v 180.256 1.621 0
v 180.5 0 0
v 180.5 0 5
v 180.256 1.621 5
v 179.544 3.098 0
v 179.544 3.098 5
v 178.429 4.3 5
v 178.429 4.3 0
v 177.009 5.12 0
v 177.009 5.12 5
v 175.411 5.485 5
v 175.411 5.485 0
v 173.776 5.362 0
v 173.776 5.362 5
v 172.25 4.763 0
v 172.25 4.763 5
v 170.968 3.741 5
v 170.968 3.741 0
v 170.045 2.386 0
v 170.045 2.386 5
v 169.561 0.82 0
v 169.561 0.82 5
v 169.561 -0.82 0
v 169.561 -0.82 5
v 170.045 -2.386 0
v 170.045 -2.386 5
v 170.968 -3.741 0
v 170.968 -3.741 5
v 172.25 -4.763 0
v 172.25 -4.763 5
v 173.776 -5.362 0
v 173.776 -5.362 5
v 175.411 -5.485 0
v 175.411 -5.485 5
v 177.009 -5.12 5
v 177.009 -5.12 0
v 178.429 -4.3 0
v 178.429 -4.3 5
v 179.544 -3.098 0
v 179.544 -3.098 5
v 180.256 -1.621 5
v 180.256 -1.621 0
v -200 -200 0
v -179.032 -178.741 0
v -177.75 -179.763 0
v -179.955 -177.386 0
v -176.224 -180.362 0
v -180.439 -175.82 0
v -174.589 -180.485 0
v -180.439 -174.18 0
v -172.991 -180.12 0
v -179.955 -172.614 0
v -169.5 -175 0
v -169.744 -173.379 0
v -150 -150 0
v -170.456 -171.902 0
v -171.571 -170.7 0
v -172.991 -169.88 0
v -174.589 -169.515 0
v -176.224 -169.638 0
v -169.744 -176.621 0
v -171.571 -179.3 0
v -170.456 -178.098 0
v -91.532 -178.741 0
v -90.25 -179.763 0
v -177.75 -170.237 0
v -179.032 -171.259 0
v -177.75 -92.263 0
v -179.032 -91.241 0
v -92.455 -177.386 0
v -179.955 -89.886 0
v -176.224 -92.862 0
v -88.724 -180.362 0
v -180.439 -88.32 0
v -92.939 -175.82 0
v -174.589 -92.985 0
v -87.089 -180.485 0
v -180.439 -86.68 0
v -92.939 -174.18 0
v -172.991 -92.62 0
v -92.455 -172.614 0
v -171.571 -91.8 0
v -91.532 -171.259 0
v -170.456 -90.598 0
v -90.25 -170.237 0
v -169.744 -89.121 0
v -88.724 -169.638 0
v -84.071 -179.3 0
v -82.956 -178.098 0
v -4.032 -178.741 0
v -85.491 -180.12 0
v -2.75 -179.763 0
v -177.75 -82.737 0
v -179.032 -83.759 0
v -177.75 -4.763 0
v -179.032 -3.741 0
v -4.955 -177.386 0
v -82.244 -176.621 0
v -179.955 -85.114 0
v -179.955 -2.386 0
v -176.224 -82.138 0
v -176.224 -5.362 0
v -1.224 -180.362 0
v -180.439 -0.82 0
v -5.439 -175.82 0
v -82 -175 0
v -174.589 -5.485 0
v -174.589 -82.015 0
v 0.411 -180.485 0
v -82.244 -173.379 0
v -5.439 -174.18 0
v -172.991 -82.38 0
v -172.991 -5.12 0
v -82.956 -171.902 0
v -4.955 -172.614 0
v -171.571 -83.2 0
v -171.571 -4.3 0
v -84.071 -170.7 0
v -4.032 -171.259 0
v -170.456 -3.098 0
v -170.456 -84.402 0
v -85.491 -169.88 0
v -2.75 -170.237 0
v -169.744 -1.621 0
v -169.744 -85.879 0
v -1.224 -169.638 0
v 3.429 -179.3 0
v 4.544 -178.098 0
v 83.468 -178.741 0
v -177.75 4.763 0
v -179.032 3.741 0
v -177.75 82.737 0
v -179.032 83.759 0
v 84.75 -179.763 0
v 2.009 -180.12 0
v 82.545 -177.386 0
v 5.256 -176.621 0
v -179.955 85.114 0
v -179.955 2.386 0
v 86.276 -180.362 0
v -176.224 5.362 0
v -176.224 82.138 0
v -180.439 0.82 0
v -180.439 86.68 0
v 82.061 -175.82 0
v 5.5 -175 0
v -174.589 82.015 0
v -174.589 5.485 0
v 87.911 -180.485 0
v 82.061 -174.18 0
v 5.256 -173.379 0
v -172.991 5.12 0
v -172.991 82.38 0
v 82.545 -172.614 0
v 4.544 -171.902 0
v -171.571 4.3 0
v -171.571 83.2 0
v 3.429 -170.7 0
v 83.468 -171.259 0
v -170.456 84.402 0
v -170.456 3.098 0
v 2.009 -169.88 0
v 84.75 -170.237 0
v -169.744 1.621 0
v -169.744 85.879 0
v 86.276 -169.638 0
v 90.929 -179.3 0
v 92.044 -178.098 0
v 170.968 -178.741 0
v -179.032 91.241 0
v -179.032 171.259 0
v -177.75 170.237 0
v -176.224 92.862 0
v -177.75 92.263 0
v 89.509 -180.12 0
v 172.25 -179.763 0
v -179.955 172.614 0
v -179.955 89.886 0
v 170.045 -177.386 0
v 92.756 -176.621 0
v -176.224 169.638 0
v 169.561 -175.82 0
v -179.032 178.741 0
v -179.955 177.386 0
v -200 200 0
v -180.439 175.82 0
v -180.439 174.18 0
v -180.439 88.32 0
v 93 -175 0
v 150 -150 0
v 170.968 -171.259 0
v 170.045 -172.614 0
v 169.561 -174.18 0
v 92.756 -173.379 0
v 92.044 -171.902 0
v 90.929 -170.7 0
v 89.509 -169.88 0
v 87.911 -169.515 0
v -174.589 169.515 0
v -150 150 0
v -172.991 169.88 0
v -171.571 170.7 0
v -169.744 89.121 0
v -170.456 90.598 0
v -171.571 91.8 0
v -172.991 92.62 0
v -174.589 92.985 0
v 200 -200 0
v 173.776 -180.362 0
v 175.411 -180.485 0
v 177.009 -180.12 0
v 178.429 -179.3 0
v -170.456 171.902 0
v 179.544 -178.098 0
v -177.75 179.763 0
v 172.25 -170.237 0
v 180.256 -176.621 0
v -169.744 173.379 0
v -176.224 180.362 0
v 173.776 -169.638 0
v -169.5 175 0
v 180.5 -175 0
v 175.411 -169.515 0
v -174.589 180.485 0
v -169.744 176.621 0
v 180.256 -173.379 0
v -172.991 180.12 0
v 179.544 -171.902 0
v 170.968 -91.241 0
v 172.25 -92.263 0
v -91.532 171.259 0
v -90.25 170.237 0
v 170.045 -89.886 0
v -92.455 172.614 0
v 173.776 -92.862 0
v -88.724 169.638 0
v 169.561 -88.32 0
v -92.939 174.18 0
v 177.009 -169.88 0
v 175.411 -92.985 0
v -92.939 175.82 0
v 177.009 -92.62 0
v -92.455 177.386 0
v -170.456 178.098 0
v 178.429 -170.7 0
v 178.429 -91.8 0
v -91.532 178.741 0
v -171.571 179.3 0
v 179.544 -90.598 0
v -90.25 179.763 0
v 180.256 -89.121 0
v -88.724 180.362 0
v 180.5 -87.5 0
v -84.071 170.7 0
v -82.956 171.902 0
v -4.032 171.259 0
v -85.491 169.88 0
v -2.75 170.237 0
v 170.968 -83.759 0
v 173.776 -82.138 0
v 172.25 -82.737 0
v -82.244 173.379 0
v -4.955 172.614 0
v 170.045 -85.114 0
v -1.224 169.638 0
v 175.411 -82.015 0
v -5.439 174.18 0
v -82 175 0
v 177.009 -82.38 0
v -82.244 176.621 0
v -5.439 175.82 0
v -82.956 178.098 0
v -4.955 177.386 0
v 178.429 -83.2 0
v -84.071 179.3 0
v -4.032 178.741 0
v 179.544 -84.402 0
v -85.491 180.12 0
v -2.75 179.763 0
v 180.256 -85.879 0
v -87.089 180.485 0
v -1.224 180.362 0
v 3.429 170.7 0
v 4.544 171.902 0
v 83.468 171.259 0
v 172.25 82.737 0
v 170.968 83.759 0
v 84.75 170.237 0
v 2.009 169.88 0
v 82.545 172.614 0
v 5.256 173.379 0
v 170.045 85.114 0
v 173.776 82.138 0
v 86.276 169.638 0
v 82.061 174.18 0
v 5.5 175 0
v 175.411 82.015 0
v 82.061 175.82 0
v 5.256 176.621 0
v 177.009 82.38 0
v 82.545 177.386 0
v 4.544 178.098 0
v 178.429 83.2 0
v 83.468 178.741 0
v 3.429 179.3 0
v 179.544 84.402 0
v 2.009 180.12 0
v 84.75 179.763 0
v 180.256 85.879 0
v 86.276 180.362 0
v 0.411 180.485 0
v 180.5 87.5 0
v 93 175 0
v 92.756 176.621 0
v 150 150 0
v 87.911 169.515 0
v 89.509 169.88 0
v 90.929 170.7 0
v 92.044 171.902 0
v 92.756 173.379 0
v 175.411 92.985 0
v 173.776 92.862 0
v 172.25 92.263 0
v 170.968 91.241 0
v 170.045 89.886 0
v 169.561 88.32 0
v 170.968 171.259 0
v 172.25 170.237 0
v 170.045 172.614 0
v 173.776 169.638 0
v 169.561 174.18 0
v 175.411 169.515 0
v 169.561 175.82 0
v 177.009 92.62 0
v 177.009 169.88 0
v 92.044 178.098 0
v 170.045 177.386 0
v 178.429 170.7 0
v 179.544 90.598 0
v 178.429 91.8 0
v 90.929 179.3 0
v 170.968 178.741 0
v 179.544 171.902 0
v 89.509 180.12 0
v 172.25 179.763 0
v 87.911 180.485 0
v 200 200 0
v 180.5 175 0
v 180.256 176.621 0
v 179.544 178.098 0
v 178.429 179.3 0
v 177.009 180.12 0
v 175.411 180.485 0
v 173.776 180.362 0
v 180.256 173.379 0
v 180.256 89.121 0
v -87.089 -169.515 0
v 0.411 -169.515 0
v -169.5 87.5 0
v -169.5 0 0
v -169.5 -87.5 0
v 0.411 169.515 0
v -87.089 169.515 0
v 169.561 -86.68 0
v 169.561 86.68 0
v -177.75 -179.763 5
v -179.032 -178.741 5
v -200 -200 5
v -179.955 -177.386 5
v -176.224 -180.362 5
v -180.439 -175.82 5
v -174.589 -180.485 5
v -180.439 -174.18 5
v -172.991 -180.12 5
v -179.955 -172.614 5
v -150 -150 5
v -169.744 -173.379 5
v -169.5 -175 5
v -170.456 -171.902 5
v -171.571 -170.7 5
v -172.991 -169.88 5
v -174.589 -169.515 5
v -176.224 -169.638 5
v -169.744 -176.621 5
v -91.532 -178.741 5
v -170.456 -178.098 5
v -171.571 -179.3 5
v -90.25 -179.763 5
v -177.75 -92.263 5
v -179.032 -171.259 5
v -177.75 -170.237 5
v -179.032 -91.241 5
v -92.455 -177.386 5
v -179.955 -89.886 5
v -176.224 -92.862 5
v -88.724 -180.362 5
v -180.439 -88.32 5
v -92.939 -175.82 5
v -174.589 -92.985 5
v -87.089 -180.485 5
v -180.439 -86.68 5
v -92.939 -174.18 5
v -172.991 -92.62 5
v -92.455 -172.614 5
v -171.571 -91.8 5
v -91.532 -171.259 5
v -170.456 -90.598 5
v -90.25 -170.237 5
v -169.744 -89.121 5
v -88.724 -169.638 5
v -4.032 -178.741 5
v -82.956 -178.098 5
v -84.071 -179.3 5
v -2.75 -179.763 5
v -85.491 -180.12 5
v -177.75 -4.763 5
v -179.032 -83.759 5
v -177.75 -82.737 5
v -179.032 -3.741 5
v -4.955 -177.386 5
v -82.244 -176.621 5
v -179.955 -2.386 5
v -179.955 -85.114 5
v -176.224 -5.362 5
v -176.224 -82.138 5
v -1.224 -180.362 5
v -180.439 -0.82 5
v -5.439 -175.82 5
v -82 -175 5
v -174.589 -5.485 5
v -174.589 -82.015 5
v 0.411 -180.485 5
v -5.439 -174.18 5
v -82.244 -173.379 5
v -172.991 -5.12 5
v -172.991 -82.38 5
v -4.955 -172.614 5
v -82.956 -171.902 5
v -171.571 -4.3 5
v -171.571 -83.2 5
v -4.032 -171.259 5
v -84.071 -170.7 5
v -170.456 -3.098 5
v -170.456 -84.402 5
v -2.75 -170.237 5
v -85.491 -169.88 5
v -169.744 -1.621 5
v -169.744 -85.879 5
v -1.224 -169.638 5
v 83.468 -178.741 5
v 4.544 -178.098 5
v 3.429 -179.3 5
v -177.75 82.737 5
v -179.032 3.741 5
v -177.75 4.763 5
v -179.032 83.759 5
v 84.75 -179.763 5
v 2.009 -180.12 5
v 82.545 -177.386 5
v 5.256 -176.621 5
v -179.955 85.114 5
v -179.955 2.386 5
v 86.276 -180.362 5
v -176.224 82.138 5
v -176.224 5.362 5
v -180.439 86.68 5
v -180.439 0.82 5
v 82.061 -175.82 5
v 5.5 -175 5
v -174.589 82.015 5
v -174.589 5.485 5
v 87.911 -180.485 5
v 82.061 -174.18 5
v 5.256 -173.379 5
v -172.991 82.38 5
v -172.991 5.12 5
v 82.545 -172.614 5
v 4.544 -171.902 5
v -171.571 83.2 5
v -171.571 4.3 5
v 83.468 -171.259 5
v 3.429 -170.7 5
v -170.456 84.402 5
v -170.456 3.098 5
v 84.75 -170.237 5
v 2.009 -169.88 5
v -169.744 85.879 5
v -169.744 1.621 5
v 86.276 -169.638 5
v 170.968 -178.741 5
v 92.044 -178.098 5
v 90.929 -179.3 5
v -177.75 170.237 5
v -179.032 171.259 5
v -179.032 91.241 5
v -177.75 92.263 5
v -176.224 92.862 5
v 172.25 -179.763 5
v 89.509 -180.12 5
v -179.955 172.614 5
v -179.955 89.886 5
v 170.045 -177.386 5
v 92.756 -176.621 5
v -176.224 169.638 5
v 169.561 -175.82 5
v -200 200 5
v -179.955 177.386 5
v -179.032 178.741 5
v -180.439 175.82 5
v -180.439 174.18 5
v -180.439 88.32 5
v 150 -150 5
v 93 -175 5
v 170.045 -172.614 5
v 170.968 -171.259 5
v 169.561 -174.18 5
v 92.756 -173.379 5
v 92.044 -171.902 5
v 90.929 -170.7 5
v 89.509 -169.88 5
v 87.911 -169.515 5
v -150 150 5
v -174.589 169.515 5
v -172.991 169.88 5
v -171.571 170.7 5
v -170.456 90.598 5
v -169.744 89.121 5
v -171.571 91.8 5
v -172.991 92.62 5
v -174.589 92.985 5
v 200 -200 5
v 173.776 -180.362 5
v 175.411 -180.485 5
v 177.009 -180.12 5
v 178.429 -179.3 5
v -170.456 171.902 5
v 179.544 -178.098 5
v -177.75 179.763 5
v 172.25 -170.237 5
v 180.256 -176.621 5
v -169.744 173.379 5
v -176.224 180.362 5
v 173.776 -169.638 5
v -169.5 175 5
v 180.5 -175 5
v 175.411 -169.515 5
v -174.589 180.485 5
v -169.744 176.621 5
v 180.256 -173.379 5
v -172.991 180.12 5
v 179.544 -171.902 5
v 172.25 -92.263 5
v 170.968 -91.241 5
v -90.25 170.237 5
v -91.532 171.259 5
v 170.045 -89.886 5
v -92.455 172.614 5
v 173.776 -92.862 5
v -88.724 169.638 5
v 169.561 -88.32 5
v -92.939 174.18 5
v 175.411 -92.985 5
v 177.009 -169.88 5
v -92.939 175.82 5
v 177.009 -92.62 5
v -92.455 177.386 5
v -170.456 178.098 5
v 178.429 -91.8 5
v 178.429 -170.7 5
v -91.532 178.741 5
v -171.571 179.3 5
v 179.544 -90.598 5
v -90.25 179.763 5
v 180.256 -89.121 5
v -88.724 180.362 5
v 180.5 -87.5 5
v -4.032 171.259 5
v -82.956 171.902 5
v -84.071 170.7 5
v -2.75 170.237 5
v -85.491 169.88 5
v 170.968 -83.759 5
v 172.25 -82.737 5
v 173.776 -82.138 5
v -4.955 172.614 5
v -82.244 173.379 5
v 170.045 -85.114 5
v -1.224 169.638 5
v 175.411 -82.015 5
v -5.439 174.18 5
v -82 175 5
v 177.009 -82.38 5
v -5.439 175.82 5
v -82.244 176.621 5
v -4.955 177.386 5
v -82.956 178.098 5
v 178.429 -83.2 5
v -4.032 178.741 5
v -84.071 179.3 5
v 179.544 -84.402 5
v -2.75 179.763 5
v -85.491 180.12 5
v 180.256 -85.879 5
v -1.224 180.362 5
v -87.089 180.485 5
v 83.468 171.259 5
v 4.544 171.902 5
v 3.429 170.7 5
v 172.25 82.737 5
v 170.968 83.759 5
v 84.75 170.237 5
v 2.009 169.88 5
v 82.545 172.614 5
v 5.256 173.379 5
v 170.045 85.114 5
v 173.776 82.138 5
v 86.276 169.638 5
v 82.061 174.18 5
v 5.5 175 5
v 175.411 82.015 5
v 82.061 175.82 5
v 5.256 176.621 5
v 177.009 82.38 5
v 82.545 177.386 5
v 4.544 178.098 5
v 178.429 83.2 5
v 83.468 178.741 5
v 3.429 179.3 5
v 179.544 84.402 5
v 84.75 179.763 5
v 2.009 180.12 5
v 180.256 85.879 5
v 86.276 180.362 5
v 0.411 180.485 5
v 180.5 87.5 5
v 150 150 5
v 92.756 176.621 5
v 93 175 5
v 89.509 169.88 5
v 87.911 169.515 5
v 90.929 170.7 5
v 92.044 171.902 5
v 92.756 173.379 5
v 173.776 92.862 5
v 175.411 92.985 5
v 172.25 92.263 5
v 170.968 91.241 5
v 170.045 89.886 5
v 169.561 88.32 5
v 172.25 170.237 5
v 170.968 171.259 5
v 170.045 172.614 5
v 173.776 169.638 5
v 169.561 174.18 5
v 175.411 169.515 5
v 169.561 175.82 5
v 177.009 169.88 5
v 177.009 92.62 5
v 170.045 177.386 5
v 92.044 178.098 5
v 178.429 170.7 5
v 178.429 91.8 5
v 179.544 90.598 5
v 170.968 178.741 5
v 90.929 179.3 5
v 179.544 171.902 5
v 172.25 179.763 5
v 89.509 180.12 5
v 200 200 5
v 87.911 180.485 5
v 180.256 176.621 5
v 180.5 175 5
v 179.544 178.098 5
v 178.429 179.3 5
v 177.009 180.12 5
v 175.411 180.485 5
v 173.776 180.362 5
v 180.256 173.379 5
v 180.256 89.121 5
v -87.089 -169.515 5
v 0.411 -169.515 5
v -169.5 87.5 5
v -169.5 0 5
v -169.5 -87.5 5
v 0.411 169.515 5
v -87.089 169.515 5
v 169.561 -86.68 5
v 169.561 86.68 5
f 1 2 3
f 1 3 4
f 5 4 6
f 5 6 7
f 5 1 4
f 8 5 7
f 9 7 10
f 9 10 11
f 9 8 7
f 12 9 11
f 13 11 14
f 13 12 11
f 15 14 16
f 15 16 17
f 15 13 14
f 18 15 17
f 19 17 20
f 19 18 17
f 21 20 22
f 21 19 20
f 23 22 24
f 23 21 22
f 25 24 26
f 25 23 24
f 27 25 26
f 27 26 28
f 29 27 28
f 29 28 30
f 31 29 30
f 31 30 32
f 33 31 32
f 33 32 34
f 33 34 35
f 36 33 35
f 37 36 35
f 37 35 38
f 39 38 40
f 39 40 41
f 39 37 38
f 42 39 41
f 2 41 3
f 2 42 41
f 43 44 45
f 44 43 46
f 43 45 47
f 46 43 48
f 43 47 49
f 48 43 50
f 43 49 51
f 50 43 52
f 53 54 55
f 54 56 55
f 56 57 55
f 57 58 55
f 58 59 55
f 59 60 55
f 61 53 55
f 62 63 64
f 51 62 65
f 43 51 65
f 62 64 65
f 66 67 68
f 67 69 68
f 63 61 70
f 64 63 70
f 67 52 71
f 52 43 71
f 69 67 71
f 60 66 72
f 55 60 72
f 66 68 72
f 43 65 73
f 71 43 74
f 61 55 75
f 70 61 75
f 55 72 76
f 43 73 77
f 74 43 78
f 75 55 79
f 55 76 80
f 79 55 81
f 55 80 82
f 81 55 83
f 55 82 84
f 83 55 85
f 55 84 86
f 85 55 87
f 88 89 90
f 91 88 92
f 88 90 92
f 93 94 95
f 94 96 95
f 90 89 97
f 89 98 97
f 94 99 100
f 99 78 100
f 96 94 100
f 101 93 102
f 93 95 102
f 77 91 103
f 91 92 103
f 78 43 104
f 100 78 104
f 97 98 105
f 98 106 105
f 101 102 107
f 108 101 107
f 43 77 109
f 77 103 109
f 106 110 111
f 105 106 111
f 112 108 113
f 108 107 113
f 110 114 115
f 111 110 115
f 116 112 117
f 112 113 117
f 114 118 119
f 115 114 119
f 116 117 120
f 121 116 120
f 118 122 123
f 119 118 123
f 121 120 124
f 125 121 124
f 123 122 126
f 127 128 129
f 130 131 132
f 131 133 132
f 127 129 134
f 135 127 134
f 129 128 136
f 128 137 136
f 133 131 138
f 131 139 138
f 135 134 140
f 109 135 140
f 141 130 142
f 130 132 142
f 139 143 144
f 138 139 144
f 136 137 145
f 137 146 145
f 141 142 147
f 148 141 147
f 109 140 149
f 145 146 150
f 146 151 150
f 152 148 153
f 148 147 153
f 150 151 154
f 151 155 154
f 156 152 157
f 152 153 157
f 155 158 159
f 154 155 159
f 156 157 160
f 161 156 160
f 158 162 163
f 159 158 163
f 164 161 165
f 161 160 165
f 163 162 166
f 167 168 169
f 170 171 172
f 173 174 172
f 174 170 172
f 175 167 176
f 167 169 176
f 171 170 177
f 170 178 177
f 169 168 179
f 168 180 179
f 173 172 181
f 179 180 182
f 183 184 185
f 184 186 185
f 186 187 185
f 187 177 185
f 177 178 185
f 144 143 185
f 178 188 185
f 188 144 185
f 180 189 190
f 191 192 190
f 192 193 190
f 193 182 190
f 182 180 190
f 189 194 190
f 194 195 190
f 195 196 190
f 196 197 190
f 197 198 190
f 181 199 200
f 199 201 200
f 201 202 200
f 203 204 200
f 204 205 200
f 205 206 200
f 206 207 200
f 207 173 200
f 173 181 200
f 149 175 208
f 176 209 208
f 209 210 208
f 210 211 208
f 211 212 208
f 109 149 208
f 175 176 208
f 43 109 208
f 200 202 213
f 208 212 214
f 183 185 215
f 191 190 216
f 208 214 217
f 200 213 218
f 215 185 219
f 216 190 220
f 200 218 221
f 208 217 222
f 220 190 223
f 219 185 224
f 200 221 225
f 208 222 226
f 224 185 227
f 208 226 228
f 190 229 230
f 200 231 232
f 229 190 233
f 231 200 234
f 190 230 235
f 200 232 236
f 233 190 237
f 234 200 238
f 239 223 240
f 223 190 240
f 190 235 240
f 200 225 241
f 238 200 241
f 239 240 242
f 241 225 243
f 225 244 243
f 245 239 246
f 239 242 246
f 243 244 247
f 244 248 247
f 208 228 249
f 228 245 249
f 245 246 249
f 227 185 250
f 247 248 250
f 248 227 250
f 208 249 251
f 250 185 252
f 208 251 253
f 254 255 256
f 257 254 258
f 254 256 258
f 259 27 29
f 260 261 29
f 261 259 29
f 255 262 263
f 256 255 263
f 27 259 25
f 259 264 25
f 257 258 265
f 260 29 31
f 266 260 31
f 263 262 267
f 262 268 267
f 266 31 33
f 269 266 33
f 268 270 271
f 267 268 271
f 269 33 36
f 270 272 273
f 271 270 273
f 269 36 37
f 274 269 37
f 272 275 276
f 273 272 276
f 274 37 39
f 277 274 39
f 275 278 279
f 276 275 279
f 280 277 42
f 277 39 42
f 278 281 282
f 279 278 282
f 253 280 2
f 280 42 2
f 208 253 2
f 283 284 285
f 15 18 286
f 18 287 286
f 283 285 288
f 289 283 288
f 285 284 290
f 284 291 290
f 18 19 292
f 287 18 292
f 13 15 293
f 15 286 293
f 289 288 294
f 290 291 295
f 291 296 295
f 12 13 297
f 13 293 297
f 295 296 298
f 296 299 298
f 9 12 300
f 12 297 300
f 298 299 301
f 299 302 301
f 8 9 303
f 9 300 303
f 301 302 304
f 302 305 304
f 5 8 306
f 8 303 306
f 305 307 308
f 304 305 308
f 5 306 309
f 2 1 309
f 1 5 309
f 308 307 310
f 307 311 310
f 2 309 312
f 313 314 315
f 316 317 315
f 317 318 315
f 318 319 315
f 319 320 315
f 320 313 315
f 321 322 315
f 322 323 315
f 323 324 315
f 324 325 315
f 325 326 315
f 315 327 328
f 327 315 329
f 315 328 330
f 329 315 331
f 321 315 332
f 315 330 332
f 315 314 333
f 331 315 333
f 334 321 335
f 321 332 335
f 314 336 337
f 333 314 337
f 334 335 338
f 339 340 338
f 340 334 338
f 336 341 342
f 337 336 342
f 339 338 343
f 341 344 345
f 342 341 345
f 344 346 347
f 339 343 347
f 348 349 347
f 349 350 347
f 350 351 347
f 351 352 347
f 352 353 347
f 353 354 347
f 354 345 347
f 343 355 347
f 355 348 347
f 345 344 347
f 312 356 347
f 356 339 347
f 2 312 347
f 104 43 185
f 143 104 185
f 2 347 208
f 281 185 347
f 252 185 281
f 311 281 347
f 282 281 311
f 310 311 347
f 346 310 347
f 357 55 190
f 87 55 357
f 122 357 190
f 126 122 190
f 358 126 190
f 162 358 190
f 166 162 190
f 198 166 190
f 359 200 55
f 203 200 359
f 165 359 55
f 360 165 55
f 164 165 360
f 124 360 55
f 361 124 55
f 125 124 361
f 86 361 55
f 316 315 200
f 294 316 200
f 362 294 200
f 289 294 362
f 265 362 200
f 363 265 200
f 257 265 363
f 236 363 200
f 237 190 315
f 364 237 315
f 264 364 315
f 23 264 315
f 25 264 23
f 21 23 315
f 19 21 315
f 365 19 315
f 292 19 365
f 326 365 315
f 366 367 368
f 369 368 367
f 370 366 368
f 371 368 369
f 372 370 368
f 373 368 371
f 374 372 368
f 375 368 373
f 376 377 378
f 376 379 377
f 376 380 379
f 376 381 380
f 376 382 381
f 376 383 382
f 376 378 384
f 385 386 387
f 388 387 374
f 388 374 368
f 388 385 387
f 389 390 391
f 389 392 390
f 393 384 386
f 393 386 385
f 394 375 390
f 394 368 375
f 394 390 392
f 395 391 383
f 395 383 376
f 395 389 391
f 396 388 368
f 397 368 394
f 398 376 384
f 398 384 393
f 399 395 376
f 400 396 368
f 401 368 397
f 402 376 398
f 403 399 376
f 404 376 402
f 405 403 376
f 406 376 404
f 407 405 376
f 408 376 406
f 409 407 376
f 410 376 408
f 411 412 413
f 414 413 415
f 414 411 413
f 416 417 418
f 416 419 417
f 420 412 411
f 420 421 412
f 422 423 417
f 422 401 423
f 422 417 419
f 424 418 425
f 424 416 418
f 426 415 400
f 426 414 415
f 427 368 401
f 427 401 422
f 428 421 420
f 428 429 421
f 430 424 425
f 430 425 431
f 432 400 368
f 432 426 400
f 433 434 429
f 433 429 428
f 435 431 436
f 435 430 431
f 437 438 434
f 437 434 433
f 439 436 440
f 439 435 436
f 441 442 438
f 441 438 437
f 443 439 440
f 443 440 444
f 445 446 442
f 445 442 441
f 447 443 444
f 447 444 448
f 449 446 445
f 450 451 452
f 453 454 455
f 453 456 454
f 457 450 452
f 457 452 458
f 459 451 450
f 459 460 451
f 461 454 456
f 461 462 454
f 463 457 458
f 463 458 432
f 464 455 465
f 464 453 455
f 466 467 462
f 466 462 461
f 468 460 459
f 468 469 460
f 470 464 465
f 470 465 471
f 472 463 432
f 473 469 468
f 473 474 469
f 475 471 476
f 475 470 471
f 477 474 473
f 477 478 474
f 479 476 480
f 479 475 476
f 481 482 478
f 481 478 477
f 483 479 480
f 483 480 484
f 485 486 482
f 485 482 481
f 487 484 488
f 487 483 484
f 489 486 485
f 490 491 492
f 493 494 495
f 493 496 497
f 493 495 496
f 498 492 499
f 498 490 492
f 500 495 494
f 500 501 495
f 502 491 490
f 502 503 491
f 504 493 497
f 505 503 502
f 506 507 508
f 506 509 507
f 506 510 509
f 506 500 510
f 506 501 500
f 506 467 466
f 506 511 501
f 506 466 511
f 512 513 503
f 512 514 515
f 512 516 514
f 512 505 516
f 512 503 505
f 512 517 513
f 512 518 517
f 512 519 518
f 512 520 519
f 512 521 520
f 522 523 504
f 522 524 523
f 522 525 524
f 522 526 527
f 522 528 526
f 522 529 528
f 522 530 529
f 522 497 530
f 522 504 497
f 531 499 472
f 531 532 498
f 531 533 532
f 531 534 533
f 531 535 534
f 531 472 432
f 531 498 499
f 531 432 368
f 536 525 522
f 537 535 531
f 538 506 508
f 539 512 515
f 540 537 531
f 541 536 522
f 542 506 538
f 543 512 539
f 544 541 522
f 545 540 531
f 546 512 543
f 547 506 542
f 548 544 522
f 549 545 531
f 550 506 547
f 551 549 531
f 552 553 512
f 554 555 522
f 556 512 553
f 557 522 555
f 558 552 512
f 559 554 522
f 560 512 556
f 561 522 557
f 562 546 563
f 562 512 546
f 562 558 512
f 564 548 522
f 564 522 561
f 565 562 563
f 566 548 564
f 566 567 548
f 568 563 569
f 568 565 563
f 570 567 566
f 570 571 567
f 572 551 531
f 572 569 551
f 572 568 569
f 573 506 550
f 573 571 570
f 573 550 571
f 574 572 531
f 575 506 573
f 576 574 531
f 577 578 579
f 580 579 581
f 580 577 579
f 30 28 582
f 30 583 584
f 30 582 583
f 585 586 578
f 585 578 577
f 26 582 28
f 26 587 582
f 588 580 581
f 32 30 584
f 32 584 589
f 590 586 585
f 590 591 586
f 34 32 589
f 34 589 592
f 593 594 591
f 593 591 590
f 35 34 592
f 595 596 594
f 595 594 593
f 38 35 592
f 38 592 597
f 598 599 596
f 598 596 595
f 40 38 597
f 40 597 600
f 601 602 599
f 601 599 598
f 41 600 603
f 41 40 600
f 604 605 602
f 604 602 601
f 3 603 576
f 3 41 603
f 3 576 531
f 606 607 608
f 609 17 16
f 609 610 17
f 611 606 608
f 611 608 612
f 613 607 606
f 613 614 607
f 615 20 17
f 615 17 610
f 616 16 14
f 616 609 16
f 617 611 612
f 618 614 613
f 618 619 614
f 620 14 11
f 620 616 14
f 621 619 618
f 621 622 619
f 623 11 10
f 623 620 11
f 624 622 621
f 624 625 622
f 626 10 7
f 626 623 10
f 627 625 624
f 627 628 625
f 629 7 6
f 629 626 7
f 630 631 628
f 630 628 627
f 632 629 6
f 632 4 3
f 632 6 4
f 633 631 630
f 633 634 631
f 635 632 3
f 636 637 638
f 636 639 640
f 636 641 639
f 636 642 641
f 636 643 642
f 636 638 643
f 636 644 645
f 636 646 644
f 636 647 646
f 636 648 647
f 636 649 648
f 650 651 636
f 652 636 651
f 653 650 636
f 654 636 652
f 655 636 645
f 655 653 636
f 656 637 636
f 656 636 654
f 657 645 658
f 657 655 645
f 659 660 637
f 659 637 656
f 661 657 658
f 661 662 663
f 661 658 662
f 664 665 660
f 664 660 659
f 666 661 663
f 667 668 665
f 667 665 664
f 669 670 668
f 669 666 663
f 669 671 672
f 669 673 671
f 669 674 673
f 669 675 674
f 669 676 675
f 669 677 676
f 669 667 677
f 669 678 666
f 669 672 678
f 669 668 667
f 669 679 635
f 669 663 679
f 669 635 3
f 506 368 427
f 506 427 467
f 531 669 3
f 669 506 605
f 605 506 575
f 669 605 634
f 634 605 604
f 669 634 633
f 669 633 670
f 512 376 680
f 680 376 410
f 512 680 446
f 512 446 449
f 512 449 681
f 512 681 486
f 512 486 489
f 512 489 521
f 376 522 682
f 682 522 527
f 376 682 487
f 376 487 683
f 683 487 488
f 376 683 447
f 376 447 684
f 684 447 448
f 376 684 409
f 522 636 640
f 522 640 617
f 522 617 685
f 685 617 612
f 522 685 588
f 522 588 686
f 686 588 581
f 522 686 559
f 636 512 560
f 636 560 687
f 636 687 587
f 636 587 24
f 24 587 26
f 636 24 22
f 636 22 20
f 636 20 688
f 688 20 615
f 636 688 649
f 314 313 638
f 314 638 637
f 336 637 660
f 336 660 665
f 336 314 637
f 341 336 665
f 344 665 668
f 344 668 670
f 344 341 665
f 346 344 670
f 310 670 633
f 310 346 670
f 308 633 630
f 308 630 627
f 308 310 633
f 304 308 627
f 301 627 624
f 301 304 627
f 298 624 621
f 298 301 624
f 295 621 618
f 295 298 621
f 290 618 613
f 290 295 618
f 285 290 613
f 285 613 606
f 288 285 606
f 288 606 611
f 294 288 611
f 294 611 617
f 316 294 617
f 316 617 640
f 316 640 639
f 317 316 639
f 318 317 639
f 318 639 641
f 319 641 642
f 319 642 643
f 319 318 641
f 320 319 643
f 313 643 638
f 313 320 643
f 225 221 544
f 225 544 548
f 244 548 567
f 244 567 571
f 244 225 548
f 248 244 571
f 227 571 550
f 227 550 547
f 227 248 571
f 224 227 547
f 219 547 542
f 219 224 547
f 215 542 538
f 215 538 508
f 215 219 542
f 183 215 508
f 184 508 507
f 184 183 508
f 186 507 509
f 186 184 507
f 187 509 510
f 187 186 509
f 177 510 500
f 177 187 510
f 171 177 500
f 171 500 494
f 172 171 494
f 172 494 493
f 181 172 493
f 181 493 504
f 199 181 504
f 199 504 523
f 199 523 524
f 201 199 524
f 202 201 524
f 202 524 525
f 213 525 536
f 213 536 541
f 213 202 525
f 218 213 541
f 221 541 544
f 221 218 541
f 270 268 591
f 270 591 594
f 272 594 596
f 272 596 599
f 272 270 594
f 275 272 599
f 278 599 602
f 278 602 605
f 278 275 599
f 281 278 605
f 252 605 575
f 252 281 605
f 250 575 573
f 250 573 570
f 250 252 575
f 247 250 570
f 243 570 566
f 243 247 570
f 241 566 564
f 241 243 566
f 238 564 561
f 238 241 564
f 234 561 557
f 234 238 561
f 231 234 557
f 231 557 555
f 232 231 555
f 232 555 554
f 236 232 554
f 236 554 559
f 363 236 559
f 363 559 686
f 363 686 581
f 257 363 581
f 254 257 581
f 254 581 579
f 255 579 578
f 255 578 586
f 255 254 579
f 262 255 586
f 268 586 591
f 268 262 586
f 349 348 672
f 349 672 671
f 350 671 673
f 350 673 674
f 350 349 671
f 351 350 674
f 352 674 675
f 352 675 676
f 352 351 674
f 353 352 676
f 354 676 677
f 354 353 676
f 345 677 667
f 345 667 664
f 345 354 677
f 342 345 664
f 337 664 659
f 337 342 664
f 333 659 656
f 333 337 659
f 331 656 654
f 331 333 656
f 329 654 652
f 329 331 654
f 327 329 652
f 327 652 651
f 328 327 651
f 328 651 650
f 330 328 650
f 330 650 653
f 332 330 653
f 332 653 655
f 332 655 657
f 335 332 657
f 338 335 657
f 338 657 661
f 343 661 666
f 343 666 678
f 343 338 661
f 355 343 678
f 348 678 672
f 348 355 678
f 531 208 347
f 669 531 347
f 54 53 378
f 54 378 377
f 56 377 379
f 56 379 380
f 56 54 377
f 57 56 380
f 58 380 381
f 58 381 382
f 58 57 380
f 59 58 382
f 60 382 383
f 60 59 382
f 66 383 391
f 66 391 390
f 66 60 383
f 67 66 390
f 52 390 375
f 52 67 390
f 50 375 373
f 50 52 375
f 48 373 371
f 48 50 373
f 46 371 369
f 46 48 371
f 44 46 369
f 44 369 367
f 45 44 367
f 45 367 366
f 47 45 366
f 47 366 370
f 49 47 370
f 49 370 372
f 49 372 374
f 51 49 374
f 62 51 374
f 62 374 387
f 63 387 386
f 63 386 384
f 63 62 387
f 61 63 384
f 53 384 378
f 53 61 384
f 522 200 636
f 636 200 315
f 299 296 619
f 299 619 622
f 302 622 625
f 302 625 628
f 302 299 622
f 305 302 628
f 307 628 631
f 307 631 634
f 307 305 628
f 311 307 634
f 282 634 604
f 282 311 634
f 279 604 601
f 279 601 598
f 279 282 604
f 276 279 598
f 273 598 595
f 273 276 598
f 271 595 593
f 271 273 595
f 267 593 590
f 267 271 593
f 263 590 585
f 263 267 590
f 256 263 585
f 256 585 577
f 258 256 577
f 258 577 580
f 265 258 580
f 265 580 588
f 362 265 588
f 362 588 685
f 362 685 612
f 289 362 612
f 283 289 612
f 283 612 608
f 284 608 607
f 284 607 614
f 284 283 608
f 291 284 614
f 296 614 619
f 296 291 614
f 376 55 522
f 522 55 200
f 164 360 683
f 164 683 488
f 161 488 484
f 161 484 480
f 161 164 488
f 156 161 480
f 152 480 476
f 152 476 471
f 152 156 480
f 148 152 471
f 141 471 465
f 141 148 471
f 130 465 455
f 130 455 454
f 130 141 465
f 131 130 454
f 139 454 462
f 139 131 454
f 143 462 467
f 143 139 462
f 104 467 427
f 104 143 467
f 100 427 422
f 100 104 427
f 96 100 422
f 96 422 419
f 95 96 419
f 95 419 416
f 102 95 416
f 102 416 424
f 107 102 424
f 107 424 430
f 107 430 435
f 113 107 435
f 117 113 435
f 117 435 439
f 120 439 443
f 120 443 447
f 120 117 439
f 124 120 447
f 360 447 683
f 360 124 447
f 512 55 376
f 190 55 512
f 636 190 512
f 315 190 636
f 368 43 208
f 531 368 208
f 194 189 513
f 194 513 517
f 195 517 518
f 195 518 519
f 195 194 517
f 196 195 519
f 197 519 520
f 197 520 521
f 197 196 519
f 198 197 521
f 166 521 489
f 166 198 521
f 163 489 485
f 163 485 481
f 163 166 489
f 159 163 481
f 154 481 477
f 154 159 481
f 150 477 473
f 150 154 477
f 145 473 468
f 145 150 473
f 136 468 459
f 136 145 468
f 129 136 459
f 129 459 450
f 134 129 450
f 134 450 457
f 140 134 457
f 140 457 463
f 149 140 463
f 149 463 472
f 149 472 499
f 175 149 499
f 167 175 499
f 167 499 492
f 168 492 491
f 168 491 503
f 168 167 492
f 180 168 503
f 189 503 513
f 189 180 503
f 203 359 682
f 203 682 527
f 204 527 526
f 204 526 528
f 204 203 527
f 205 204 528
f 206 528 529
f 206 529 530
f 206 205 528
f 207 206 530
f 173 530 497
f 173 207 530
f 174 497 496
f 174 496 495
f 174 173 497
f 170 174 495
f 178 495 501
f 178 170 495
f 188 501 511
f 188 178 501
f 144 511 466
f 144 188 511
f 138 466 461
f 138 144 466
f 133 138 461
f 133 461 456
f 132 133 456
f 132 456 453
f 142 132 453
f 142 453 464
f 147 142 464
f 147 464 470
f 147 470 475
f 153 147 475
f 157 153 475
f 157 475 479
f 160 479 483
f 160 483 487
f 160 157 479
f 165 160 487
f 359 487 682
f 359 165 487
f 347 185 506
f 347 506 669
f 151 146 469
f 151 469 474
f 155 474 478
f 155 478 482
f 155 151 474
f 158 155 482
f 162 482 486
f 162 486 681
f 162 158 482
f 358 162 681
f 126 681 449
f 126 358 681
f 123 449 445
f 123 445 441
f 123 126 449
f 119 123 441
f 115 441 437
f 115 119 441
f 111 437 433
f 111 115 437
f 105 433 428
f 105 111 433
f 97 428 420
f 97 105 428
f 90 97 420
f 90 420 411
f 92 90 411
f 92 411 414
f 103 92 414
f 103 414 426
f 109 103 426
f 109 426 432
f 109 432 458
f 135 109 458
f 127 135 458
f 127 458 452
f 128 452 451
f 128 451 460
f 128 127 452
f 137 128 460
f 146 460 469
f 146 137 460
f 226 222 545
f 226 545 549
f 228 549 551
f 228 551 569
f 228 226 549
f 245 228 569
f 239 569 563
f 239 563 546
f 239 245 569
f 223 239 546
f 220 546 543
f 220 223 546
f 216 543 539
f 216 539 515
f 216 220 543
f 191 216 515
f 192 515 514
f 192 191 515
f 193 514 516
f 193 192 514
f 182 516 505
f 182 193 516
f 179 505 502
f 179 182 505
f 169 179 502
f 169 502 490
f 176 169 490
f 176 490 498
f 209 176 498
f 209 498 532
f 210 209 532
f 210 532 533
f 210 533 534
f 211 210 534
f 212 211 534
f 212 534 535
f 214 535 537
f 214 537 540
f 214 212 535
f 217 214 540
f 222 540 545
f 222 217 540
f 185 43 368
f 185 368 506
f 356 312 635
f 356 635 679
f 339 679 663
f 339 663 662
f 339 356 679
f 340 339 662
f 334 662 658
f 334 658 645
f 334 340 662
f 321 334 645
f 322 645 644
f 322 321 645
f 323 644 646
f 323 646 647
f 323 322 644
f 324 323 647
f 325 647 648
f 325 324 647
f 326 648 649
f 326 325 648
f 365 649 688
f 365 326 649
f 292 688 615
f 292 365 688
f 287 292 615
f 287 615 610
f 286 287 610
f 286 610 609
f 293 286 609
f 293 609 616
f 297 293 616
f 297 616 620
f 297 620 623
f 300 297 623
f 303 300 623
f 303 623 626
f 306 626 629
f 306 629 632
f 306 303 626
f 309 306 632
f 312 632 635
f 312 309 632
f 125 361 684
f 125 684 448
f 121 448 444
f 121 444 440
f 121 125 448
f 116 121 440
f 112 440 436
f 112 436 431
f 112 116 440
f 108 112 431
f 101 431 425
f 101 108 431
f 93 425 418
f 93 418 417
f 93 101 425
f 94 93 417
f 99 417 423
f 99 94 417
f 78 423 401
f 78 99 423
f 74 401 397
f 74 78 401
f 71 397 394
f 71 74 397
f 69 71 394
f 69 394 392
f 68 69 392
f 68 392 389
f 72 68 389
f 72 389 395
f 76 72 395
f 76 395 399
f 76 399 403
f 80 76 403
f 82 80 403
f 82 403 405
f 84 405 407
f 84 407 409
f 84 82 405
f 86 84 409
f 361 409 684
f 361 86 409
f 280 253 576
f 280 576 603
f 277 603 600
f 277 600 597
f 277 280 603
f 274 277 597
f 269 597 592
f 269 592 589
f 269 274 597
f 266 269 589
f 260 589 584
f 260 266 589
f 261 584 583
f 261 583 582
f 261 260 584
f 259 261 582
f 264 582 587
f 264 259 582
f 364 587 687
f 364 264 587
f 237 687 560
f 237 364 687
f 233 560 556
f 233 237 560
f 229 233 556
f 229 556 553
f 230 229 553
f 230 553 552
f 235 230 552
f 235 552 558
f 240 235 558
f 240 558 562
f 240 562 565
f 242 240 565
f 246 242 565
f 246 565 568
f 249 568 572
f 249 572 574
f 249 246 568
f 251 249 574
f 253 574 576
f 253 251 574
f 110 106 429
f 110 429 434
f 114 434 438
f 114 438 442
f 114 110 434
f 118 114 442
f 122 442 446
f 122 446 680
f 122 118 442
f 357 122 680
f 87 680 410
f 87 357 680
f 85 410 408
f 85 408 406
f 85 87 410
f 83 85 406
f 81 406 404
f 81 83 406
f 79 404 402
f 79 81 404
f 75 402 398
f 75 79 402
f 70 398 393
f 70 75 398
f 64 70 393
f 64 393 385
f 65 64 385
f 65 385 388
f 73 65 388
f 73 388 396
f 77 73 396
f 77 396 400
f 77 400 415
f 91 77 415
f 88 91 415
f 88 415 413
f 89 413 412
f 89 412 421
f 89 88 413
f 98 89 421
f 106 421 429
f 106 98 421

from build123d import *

# Parameters (mm, degrees)
F0_W     = 400
F0_H     = 400
F0_R     = 5.5
F0_W_2   = 300
F0_H_2   = 300
F1_DEPTH = 5


with BuildPart() as f1:
    # F0 (on Top) → F1 (new body)
    with BuildSketch(Plane.XY):
        Rectangle(F0_W, F0_H)
        with Locations((-175, -175)):
            Circle(F0_R, mode=Mode.SUBTRACT)
        with Locations((-87.5, -175)):
            Circle(F0_R, mode=Mode.SUBTRACT)
        with Locations((-175, -87.5)):
            Circle(F0_R, mode=Mode.SUBTRACT)
        with Locations((0, -175)):
            Circle(F0_R, mode=Mode.SUBTRACT)
        with Locations((87.5, -175)):
            Circle(F0_R, mode=Mode.SUBTRACT)
        with Locations((175, -175)):
            Circle(F0_R, mode=Mode.SUBTRACT)
        with Locations((175, -87.5)):
            Circle(F0_R, mode=Mode.SUBTRACT)
        with Locations((-175, 0)):
            Circle(F0_R, mode=Mode.SUBTRACT)
        with Locations((-175, 87.5)):
            Circle(F0_R, mode=Mode.SUBTRACT)
        with Locations((-175, 175)):
            Circle(F0_R, mode=Mode.SUBTRACT)
        with Locations((-87.5, 175)):
            Circle(F0_R, mode=Mode.SUBTRACT)
        Rectangle(F0_W_2, F0_H_2, mode=Mode.SUBTRACT)
        with Locations((175, 0)):
            Circle(F0_R, mode=Mode.SUBTRACT)
        with Locations((175, 87.5)):
            Circle(F0_R, mode=Mode.SUBTRACT)
        with Locations((0, 175)):
            Circle(F0_R, mode=Mode.SUBTRACT)
        with Locations((87.5, 175)):
            Circle(F0_R, mode=Mode.SUBTRACT)
        with Locations((175, 175)):
            Circle(F0_R, mode=Mode.SUBTRACT)
    extrude(amount=F1_DEPTH)


solid = f1.part
